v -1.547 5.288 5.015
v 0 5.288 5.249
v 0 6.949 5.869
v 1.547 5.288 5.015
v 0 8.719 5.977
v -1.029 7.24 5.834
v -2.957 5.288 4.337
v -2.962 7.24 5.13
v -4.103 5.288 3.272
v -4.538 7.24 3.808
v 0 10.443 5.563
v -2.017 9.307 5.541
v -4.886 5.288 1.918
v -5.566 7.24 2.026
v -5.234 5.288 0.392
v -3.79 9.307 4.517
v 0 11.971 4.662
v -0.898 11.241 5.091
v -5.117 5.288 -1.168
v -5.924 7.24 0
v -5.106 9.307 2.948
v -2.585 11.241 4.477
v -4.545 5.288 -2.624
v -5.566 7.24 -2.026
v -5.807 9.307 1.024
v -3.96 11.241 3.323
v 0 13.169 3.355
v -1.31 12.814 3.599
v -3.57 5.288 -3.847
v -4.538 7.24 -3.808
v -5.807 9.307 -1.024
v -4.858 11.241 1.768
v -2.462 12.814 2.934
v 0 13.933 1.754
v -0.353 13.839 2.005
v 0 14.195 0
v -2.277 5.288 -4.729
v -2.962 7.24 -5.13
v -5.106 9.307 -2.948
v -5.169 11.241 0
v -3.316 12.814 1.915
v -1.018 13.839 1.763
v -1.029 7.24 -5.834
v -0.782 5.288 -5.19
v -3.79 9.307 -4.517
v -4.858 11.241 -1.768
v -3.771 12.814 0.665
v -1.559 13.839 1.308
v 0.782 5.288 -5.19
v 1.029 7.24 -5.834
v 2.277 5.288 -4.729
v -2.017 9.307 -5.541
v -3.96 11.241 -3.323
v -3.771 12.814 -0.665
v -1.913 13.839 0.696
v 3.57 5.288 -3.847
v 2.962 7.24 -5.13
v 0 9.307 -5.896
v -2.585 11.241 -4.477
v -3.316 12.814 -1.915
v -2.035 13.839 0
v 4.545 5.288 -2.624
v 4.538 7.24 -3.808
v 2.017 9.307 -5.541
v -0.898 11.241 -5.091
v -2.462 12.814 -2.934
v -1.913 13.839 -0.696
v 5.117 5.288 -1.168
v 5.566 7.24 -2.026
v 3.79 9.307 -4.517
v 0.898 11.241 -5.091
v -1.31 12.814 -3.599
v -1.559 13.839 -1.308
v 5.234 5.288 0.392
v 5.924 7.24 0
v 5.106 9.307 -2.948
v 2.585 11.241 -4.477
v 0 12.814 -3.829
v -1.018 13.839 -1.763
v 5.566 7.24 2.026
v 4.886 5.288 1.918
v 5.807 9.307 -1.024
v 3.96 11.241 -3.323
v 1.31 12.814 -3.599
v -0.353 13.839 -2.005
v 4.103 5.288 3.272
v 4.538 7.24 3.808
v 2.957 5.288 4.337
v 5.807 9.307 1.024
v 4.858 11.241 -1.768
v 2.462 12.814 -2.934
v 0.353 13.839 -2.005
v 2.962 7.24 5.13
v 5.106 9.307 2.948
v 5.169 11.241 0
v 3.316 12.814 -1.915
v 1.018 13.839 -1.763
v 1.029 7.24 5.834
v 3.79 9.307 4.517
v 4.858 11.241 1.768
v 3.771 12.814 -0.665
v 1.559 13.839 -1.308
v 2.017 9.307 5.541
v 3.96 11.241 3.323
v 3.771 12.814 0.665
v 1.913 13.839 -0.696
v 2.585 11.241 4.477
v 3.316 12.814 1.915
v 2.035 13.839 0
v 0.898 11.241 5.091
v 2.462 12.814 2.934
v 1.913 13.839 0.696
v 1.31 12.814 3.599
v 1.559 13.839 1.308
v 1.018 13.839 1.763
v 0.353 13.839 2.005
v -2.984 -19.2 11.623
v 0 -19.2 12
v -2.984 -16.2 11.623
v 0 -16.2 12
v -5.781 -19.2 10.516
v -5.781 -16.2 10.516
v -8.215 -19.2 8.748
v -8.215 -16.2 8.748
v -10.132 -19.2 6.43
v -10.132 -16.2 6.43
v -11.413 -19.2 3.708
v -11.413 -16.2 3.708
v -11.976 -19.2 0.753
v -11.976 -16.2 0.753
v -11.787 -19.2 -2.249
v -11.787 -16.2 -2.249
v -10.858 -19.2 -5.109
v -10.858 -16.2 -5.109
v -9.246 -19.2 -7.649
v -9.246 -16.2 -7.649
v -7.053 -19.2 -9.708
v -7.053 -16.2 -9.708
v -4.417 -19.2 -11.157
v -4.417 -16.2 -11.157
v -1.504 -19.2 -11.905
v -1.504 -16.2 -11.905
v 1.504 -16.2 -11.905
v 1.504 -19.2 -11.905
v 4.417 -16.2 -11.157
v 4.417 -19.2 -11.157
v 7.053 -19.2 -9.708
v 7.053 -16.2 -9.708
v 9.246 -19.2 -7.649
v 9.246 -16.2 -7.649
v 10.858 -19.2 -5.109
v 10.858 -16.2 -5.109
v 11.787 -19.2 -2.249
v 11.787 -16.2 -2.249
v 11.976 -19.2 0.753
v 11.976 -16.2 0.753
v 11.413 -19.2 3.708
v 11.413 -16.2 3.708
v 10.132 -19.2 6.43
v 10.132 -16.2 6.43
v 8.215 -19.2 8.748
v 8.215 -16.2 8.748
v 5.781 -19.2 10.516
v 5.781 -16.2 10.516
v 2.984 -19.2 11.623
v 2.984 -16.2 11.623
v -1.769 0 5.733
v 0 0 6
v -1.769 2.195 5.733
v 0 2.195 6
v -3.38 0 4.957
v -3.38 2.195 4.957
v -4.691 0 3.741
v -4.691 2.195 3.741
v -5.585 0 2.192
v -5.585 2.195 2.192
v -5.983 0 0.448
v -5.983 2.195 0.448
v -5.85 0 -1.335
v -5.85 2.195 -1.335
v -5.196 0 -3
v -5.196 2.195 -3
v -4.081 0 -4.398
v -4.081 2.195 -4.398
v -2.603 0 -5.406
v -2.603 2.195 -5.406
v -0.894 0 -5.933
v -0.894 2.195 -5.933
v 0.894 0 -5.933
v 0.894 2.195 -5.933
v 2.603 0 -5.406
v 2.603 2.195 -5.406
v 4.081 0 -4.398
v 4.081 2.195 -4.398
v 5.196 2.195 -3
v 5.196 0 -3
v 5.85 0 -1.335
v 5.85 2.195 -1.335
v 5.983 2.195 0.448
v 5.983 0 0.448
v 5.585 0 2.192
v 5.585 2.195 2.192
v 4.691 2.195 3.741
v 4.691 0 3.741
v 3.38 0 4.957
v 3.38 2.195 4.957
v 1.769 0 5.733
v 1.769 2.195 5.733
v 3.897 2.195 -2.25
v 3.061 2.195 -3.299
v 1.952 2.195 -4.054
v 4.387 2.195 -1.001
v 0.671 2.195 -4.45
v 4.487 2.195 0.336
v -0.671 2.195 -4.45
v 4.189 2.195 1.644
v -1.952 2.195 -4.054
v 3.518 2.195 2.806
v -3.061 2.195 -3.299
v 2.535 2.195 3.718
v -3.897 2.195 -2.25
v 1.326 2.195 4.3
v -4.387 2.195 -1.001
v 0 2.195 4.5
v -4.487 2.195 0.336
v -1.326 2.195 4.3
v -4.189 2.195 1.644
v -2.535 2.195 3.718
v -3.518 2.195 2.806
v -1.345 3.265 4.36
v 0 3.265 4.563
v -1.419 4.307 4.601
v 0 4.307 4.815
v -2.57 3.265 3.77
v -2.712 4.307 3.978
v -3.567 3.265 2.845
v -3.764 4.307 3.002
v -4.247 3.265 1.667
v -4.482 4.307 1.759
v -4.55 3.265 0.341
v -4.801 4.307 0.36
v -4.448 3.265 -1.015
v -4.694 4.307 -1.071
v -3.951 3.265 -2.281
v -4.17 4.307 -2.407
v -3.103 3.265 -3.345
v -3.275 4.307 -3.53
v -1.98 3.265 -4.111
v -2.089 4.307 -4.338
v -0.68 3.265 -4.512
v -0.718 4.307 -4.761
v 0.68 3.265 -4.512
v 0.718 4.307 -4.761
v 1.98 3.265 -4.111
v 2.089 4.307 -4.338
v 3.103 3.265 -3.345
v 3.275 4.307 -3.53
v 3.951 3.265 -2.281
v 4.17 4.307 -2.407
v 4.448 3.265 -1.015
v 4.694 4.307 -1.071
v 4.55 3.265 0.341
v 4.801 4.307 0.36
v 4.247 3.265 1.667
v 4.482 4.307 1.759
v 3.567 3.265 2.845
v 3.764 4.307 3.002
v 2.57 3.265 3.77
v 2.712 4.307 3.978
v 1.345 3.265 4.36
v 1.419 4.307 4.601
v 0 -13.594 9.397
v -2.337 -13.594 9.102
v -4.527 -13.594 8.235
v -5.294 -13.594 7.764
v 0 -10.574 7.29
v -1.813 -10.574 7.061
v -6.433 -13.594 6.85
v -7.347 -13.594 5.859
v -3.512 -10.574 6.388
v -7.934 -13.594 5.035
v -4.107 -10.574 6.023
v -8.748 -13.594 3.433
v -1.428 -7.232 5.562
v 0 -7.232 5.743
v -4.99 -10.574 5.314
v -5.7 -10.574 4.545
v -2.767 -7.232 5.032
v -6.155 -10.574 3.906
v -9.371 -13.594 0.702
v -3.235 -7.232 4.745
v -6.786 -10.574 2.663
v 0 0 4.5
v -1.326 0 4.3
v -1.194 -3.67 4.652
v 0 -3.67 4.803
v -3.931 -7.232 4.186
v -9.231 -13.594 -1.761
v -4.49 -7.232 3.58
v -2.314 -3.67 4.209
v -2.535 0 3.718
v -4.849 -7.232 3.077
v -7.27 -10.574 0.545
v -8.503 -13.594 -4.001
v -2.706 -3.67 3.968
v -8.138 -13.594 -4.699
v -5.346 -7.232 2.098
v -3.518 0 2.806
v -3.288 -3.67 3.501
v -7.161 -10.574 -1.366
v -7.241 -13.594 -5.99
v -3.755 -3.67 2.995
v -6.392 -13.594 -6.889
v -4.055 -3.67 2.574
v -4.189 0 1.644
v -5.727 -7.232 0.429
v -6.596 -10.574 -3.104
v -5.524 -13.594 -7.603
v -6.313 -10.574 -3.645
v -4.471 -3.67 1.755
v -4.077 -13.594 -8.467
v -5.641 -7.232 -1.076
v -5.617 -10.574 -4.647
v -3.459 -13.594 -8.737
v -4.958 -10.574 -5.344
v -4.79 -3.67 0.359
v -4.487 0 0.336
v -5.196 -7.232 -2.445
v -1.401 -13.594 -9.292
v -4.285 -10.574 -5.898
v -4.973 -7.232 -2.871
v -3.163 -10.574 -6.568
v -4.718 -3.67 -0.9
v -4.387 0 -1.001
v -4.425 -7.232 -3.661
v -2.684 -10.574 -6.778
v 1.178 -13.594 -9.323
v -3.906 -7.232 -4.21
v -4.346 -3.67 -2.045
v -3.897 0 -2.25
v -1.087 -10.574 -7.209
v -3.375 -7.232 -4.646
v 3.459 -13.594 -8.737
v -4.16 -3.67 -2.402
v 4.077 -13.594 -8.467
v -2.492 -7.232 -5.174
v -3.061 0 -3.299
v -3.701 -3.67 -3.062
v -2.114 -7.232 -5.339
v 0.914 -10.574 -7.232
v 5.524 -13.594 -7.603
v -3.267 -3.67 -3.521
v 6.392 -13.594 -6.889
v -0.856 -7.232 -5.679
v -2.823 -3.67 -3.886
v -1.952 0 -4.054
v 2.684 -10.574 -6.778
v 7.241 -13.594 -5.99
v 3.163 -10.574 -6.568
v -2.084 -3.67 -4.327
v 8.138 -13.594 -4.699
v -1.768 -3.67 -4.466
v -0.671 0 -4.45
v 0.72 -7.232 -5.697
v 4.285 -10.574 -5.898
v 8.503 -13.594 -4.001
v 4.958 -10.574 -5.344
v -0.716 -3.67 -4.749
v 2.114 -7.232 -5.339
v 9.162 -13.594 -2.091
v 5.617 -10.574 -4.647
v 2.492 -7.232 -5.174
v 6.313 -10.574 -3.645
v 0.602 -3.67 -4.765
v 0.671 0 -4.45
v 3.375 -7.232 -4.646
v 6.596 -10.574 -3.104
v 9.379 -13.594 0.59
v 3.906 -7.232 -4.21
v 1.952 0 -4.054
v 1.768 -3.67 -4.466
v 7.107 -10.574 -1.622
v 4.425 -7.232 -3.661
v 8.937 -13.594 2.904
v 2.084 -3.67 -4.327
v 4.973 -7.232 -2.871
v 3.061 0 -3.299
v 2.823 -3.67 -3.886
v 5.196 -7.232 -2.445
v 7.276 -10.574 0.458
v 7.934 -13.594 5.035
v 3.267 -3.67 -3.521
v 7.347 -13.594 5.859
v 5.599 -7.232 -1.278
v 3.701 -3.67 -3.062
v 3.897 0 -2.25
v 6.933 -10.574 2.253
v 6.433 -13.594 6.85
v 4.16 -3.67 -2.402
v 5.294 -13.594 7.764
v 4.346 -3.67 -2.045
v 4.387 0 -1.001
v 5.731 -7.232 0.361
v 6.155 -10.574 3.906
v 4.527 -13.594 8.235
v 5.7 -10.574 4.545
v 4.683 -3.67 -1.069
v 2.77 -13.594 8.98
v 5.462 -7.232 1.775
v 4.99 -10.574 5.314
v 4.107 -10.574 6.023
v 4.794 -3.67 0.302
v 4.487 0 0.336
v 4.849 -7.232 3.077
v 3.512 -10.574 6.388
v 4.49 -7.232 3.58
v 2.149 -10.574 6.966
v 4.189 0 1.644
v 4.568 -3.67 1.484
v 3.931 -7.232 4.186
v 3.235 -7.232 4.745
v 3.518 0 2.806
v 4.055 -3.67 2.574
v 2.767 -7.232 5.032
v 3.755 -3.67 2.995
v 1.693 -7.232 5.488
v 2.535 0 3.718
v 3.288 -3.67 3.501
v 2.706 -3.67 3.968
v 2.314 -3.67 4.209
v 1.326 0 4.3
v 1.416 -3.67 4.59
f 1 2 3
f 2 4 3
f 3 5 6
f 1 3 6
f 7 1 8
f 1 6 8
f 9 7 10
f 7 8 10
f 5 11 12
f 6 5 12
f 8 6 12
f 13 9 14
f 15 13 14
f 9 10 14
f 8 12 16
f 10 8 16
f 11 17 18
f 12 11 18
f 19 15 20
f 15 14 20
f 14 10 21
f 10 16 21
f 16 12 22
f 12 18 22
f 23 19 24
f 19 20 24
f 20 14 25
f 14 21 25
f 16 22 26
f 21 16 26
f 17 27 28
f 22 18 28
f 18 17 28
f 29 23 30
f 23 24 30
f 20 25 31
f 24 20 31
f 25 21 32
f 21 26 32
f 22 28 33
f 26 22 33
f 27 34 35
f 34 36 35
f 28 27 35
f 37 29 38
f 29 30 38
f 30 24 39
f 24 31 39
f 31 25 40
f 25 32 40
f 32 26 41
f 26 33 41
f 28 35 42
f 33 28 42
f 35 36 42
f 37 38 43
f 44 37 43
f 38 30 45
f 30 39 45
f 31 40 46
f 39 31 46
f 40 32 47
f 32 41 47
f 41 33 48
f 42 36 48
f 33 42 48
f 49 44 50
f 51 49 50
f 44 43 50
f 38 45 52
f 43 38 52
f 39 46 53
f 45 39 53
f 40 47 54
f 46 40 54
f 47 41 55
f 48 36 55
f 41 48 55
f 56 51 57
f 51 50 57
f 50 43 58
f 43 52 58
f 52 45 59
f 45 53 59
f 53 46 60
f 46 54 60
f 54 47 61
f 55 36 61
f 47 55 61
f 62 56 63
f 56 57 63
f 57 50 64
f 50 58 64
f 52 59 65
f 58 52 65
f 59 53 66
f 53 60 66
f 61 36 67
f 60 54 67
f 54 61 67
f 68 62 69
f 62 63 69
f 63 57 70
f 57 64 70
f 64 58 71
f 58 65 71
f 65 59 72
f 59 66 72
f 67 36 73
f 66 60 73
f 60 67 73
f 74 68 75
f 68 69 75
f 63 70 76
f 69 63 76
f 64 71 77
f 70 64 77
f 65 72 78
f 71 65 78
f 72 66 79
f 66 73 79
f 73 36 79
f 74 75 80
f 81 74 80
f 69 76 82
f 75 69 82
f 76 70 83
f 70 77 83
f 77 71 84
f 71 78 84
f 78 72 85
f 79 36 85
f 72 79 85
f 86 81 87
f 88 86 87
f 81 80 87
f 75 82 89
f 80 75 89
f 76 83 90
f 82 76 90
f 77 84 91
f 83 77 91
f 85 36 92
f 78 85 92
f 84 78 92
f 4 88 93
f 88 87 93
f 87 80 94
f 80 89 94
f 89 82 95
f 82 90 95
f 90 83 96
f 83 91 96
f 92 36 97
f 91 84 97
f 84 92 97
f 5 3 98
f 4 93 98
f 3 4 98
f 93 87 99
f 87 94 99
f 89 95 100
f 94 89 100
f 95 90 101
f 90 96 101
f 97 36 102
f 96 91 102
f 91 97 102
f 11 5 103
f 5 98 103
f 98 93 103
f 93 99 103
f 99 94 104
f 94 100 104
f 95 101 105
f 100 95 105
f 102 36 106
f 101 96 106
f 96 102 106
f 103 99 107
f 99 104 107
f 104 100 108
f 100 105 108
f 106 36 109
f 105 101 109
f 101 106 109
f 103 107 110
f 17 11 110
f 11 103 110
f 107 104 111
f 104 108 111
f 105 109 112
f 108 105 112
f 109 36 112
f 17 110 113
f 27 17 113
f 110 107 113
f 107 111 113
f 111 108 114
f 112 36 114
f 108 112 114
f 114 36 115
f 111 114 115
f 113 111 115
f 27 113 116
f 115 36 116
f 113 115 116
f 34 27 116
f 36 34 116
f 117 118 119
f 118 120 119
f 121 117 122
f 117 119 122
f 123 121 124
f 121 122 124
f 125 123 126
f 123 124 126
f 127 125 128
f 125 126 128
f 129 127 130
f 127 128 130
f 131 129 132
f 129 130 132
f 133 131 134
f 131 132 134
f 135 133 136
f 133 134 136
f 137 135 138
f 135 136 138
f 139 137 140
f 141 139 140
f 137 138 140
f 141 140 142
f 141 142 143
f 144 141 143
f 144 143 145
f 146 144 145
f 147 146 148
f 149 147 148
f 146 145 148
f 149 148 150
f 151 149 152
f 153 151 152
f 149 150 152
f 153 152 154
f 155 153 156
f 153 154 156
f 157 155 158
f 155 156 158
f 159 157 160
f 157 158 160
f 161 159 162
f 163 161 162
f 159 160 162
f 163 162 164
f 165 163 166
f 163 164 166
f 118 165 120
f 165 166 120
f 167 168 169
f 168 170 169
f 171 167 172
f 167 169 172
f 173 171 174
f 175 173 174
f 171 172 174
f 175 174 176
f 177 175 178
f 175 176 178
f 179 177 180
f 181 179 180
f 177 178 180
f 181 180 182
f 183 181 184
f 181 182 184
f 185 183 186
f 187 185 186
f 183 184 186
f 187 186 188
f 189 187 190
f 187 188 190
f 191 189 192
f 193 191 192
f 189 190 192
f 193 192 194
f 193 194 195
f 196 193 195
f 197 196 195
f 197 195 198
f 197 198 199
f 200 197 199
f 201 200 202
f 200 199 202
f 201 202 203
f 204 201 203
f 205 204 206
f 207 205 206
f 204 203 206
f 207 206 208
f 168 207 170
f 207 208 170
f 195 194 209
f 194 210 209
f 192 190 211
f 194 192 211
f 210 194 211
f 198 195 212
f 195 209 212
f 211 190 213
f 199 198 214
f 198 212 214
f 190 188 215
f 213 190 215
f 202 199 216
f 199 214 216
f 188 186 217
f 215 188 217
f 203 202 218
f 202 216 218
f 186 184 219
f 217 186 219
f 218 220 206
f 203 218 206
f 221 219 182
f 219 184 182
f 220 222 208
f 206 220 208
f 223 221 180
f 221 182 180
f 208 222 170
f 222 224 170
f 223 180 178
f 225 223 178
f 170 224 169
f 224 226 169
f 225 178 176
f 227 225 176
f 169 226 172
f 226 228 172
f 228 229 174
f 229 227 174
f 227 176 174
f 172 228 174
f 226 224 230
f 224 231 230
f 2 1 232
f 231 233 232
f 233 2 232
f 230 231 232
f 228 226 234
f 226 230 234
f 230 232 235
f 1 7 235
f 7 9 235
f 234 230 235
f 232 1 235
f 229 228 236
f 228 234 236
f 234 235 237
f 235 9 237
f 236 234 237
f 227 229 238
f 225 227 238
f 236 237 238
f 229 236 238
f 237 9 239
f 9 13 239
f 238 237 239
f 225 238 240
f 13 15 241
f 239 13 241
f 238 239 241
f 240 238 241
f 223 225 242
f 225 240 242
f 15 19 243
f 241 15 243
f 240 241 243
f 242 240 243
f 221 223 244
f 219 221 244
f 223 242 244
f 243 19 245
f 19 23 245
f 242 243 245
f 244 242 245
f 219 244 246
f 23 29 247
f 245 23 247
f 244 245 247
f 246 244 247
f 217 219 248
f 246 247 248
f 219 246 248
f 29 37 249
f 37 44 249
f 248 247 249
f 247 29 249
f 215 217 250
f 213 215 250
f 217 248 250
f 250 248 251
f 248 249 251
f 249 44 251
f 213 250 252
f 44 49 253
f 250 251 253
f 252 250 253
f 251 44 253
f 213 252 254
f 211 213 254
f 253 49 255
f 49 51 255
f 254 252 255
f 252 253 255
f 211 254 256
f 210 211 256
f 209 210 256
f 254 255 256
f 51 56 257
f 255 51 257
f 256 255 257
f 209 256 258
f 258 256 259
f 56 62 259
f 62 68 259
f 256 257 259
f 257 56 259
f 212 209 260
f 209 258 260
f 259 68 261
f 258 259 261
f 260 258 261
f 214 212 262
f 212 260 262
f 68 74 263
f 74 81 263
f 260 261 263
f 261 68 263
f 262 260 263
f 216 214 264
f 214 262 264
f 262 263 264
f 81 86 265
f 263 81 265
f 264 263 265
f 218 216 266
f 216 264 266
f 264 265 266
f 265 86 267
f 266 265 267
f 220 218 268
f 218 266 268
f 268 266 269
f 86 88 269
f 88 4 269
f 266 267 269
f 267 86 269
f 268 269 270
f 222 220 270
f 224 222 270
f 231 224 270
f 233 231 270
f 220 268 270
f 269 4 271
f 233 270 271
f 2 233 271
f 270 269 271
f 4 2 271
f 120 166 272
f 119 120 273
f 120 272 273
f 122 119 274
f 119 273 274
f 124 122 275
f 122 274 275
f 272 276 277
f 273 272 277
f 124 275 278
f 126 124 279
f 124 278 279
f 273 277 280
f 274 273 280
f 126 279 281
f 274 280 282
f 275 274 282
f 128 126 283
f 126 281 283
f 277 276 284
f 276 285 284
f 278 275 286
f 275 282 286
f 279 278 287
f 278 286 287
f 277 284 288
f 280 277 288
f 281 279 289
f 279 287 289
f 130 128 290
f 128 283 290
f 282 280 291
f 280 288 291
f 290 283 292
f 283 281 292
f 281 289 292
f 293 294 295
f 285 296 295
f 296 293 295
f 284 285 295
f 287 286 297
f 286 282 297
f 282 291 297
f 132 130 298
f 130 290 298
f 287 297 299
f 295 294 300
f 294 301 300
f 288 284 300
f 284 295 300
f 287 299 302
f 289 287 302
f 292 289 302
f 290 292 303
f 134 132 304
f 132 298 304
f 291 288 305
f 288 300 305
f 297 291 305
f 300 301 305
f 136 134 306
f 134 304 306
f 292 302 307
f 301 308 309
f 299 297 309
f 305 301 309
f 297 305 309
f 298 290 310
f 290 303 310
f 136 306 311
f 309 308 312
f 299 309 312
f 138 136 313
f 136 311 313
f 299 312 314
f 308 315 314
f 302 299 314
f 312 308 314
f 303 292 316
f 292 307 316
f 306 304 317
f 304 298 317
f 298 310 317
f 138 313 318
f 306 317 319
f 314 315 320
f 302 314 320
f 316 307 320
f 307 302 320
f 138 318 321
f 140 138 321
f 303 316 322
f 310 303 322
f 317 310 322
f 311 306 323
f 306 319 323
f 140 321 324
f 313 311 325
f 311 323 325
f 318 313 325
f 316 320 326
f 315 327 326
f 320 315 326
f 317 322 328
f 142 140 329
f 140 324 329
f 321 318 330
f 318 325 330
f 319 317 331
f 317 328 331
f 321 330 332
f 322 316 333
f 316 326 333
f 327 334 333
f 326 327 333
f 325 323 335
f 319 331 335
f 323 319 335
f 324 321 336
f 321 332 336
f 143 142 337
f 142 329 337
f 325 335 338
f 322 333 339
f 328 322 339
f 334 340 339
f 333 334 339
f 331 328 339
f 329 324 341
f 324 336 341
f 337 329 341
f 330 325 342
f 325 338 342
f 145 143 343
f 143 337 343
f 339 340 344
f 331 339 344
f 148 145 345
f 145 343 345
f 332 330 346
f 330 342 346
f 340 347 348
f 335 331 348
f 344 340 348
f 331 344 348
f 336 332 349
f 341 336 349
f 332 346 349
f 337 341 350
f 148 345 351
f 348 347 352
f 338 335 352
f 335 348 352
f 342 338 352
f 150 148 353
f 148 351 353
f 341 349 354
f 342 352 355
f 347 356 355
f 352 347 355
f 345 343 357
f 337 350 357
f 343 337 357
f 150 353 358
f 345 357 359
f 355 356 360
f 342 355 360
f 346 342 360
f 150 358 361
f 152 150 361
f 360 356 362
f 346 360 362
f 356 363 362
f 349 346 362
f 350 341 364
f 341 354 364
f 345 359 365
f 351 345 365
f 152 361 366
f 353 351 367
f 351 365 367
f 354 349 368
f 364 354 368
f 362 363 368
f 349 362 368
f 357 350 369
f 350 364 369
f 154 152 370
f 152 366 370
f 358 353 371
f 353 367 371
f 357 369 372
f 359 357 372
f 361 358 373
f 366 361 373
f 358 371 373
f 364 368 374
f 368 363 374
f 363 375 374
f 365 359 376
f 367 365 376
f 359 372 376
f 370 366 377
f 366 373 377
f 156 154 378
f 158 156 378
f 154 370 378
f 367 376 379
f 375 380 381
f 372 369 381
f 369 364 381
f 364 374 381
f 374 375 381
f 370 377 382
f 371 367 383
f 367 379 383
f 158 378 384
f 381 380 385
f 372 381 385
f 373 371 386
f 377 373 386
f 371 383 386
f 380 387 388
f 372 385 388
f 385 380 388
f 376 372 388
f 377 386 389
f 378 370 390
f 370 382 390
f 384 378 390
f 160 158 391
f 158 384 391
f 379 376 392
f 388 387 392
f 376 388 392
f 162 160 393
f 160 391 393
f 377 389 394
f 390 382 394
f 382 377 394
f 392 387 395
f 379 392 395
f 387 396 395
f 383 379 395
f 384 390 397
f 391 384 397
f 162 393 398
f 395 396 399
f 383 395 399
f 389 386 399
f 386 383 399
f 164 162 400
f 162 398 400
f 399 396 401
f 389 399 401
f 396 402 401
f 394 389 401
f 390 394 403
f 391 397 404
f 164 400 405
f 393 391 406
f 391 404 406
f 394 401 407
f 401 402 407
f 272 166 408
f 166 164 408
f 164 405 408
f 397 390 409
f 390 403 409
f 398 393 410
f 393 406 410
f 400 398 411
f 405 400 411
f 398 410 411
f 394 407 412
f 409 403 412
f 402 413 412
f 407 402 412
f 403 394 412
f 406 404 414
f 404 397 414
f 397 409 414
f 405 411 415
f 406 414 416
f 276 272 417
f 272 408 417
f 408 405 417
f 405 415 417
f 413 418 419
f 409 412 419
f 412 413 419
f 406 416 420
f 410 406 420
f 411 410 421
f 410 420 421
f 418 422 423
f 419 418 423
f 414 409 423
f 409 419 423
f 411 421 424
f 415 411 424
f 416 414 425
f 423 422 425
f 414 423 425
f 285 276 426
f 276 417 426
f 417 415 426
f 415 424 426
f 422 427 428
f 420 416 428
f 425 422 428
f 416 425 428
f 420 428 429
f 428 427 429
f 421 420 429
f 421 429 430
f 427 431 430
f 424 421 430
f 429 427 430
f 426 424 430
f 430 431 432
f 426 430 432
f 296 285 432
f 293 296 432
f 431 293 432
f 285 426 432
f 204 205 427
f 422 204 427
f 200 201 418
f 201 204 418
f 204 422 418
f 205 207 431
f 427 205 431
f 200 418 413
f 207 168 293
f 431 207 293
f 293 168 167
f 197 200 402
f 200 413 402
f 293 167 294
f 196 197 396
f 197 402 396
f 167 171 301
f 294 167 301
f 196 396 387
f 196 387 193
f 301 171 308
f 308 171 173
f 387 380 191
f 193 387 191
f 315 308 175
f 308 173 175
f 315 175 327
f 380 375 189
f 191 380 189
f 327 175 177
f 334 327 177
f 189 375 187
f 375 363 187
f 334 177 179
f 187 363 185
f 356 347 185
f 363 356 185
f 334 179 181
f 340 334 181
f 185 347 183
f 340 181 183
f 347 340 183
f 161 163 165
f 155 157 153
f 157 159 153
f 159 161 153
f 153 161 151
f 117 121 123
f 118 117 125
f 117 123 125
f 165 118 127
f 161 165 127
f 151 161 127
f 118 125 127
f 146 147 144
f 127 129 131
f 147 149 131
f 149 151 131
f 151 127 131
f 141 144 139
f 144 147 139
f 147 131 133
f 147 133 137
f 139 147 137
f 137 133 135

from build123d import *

# Parameters (mm, degrees)
SKETCH1_W     = 20
SKETCH1_H     = 5
SCALE_1_SCALE = 0.6


with BuildPart() as part:
    # Sketch1 → Revolve2 (revolve)
    with BuildSketch(Plane.XY, mode=Mode.PRIVATE) as revolve2_sk:
        with Locations((10, -29.5)):
            Rectangle(SKETCH1_W, SKETCH1_H)
        with BuildLine():
            Line((7.5, 0), (0, 0))
            Line((0, 0), (0, -27))
            Line((0, -27), (20, -27))
            ThreePointArc((20, -27), (10.738142241, -14.894378592), (7.5, 0))
        make_face()
        with BuildLine():
            ThreePointArc((8.747613634, 8.812516428), (8.61554983, 18.734698905), (0, 23.658056202))
            Line((0, 23.658056202), (0, 3.658056202))
            Line((0, 3.658056202), (7.5, 3.658056202))
            ThreePointArc((7.5, 3.658056202), (7.775883858, 6.319499484), (8.747613634, 8.812516428))
        make_face()
        Polygon((7.5, 3.658056202), (0, 3.658056202), (0, 0), (7.5, 0), (10, 0), (10, 3.658056202), align=None)
    revolve(revolve2_sk.sketch.rotate(Axis((0, 36.358430306, 0), (0, -1, 0)), 90), axis=Axis((0, 36.358430306, 0), (0, -1, 0)))


with BuildPart() as part_1:
    # 缩放比例1: scaled about (0, 0, 0)
    add(part.part.scale(SCALE_1_SCALE))


solid = part_1.part
